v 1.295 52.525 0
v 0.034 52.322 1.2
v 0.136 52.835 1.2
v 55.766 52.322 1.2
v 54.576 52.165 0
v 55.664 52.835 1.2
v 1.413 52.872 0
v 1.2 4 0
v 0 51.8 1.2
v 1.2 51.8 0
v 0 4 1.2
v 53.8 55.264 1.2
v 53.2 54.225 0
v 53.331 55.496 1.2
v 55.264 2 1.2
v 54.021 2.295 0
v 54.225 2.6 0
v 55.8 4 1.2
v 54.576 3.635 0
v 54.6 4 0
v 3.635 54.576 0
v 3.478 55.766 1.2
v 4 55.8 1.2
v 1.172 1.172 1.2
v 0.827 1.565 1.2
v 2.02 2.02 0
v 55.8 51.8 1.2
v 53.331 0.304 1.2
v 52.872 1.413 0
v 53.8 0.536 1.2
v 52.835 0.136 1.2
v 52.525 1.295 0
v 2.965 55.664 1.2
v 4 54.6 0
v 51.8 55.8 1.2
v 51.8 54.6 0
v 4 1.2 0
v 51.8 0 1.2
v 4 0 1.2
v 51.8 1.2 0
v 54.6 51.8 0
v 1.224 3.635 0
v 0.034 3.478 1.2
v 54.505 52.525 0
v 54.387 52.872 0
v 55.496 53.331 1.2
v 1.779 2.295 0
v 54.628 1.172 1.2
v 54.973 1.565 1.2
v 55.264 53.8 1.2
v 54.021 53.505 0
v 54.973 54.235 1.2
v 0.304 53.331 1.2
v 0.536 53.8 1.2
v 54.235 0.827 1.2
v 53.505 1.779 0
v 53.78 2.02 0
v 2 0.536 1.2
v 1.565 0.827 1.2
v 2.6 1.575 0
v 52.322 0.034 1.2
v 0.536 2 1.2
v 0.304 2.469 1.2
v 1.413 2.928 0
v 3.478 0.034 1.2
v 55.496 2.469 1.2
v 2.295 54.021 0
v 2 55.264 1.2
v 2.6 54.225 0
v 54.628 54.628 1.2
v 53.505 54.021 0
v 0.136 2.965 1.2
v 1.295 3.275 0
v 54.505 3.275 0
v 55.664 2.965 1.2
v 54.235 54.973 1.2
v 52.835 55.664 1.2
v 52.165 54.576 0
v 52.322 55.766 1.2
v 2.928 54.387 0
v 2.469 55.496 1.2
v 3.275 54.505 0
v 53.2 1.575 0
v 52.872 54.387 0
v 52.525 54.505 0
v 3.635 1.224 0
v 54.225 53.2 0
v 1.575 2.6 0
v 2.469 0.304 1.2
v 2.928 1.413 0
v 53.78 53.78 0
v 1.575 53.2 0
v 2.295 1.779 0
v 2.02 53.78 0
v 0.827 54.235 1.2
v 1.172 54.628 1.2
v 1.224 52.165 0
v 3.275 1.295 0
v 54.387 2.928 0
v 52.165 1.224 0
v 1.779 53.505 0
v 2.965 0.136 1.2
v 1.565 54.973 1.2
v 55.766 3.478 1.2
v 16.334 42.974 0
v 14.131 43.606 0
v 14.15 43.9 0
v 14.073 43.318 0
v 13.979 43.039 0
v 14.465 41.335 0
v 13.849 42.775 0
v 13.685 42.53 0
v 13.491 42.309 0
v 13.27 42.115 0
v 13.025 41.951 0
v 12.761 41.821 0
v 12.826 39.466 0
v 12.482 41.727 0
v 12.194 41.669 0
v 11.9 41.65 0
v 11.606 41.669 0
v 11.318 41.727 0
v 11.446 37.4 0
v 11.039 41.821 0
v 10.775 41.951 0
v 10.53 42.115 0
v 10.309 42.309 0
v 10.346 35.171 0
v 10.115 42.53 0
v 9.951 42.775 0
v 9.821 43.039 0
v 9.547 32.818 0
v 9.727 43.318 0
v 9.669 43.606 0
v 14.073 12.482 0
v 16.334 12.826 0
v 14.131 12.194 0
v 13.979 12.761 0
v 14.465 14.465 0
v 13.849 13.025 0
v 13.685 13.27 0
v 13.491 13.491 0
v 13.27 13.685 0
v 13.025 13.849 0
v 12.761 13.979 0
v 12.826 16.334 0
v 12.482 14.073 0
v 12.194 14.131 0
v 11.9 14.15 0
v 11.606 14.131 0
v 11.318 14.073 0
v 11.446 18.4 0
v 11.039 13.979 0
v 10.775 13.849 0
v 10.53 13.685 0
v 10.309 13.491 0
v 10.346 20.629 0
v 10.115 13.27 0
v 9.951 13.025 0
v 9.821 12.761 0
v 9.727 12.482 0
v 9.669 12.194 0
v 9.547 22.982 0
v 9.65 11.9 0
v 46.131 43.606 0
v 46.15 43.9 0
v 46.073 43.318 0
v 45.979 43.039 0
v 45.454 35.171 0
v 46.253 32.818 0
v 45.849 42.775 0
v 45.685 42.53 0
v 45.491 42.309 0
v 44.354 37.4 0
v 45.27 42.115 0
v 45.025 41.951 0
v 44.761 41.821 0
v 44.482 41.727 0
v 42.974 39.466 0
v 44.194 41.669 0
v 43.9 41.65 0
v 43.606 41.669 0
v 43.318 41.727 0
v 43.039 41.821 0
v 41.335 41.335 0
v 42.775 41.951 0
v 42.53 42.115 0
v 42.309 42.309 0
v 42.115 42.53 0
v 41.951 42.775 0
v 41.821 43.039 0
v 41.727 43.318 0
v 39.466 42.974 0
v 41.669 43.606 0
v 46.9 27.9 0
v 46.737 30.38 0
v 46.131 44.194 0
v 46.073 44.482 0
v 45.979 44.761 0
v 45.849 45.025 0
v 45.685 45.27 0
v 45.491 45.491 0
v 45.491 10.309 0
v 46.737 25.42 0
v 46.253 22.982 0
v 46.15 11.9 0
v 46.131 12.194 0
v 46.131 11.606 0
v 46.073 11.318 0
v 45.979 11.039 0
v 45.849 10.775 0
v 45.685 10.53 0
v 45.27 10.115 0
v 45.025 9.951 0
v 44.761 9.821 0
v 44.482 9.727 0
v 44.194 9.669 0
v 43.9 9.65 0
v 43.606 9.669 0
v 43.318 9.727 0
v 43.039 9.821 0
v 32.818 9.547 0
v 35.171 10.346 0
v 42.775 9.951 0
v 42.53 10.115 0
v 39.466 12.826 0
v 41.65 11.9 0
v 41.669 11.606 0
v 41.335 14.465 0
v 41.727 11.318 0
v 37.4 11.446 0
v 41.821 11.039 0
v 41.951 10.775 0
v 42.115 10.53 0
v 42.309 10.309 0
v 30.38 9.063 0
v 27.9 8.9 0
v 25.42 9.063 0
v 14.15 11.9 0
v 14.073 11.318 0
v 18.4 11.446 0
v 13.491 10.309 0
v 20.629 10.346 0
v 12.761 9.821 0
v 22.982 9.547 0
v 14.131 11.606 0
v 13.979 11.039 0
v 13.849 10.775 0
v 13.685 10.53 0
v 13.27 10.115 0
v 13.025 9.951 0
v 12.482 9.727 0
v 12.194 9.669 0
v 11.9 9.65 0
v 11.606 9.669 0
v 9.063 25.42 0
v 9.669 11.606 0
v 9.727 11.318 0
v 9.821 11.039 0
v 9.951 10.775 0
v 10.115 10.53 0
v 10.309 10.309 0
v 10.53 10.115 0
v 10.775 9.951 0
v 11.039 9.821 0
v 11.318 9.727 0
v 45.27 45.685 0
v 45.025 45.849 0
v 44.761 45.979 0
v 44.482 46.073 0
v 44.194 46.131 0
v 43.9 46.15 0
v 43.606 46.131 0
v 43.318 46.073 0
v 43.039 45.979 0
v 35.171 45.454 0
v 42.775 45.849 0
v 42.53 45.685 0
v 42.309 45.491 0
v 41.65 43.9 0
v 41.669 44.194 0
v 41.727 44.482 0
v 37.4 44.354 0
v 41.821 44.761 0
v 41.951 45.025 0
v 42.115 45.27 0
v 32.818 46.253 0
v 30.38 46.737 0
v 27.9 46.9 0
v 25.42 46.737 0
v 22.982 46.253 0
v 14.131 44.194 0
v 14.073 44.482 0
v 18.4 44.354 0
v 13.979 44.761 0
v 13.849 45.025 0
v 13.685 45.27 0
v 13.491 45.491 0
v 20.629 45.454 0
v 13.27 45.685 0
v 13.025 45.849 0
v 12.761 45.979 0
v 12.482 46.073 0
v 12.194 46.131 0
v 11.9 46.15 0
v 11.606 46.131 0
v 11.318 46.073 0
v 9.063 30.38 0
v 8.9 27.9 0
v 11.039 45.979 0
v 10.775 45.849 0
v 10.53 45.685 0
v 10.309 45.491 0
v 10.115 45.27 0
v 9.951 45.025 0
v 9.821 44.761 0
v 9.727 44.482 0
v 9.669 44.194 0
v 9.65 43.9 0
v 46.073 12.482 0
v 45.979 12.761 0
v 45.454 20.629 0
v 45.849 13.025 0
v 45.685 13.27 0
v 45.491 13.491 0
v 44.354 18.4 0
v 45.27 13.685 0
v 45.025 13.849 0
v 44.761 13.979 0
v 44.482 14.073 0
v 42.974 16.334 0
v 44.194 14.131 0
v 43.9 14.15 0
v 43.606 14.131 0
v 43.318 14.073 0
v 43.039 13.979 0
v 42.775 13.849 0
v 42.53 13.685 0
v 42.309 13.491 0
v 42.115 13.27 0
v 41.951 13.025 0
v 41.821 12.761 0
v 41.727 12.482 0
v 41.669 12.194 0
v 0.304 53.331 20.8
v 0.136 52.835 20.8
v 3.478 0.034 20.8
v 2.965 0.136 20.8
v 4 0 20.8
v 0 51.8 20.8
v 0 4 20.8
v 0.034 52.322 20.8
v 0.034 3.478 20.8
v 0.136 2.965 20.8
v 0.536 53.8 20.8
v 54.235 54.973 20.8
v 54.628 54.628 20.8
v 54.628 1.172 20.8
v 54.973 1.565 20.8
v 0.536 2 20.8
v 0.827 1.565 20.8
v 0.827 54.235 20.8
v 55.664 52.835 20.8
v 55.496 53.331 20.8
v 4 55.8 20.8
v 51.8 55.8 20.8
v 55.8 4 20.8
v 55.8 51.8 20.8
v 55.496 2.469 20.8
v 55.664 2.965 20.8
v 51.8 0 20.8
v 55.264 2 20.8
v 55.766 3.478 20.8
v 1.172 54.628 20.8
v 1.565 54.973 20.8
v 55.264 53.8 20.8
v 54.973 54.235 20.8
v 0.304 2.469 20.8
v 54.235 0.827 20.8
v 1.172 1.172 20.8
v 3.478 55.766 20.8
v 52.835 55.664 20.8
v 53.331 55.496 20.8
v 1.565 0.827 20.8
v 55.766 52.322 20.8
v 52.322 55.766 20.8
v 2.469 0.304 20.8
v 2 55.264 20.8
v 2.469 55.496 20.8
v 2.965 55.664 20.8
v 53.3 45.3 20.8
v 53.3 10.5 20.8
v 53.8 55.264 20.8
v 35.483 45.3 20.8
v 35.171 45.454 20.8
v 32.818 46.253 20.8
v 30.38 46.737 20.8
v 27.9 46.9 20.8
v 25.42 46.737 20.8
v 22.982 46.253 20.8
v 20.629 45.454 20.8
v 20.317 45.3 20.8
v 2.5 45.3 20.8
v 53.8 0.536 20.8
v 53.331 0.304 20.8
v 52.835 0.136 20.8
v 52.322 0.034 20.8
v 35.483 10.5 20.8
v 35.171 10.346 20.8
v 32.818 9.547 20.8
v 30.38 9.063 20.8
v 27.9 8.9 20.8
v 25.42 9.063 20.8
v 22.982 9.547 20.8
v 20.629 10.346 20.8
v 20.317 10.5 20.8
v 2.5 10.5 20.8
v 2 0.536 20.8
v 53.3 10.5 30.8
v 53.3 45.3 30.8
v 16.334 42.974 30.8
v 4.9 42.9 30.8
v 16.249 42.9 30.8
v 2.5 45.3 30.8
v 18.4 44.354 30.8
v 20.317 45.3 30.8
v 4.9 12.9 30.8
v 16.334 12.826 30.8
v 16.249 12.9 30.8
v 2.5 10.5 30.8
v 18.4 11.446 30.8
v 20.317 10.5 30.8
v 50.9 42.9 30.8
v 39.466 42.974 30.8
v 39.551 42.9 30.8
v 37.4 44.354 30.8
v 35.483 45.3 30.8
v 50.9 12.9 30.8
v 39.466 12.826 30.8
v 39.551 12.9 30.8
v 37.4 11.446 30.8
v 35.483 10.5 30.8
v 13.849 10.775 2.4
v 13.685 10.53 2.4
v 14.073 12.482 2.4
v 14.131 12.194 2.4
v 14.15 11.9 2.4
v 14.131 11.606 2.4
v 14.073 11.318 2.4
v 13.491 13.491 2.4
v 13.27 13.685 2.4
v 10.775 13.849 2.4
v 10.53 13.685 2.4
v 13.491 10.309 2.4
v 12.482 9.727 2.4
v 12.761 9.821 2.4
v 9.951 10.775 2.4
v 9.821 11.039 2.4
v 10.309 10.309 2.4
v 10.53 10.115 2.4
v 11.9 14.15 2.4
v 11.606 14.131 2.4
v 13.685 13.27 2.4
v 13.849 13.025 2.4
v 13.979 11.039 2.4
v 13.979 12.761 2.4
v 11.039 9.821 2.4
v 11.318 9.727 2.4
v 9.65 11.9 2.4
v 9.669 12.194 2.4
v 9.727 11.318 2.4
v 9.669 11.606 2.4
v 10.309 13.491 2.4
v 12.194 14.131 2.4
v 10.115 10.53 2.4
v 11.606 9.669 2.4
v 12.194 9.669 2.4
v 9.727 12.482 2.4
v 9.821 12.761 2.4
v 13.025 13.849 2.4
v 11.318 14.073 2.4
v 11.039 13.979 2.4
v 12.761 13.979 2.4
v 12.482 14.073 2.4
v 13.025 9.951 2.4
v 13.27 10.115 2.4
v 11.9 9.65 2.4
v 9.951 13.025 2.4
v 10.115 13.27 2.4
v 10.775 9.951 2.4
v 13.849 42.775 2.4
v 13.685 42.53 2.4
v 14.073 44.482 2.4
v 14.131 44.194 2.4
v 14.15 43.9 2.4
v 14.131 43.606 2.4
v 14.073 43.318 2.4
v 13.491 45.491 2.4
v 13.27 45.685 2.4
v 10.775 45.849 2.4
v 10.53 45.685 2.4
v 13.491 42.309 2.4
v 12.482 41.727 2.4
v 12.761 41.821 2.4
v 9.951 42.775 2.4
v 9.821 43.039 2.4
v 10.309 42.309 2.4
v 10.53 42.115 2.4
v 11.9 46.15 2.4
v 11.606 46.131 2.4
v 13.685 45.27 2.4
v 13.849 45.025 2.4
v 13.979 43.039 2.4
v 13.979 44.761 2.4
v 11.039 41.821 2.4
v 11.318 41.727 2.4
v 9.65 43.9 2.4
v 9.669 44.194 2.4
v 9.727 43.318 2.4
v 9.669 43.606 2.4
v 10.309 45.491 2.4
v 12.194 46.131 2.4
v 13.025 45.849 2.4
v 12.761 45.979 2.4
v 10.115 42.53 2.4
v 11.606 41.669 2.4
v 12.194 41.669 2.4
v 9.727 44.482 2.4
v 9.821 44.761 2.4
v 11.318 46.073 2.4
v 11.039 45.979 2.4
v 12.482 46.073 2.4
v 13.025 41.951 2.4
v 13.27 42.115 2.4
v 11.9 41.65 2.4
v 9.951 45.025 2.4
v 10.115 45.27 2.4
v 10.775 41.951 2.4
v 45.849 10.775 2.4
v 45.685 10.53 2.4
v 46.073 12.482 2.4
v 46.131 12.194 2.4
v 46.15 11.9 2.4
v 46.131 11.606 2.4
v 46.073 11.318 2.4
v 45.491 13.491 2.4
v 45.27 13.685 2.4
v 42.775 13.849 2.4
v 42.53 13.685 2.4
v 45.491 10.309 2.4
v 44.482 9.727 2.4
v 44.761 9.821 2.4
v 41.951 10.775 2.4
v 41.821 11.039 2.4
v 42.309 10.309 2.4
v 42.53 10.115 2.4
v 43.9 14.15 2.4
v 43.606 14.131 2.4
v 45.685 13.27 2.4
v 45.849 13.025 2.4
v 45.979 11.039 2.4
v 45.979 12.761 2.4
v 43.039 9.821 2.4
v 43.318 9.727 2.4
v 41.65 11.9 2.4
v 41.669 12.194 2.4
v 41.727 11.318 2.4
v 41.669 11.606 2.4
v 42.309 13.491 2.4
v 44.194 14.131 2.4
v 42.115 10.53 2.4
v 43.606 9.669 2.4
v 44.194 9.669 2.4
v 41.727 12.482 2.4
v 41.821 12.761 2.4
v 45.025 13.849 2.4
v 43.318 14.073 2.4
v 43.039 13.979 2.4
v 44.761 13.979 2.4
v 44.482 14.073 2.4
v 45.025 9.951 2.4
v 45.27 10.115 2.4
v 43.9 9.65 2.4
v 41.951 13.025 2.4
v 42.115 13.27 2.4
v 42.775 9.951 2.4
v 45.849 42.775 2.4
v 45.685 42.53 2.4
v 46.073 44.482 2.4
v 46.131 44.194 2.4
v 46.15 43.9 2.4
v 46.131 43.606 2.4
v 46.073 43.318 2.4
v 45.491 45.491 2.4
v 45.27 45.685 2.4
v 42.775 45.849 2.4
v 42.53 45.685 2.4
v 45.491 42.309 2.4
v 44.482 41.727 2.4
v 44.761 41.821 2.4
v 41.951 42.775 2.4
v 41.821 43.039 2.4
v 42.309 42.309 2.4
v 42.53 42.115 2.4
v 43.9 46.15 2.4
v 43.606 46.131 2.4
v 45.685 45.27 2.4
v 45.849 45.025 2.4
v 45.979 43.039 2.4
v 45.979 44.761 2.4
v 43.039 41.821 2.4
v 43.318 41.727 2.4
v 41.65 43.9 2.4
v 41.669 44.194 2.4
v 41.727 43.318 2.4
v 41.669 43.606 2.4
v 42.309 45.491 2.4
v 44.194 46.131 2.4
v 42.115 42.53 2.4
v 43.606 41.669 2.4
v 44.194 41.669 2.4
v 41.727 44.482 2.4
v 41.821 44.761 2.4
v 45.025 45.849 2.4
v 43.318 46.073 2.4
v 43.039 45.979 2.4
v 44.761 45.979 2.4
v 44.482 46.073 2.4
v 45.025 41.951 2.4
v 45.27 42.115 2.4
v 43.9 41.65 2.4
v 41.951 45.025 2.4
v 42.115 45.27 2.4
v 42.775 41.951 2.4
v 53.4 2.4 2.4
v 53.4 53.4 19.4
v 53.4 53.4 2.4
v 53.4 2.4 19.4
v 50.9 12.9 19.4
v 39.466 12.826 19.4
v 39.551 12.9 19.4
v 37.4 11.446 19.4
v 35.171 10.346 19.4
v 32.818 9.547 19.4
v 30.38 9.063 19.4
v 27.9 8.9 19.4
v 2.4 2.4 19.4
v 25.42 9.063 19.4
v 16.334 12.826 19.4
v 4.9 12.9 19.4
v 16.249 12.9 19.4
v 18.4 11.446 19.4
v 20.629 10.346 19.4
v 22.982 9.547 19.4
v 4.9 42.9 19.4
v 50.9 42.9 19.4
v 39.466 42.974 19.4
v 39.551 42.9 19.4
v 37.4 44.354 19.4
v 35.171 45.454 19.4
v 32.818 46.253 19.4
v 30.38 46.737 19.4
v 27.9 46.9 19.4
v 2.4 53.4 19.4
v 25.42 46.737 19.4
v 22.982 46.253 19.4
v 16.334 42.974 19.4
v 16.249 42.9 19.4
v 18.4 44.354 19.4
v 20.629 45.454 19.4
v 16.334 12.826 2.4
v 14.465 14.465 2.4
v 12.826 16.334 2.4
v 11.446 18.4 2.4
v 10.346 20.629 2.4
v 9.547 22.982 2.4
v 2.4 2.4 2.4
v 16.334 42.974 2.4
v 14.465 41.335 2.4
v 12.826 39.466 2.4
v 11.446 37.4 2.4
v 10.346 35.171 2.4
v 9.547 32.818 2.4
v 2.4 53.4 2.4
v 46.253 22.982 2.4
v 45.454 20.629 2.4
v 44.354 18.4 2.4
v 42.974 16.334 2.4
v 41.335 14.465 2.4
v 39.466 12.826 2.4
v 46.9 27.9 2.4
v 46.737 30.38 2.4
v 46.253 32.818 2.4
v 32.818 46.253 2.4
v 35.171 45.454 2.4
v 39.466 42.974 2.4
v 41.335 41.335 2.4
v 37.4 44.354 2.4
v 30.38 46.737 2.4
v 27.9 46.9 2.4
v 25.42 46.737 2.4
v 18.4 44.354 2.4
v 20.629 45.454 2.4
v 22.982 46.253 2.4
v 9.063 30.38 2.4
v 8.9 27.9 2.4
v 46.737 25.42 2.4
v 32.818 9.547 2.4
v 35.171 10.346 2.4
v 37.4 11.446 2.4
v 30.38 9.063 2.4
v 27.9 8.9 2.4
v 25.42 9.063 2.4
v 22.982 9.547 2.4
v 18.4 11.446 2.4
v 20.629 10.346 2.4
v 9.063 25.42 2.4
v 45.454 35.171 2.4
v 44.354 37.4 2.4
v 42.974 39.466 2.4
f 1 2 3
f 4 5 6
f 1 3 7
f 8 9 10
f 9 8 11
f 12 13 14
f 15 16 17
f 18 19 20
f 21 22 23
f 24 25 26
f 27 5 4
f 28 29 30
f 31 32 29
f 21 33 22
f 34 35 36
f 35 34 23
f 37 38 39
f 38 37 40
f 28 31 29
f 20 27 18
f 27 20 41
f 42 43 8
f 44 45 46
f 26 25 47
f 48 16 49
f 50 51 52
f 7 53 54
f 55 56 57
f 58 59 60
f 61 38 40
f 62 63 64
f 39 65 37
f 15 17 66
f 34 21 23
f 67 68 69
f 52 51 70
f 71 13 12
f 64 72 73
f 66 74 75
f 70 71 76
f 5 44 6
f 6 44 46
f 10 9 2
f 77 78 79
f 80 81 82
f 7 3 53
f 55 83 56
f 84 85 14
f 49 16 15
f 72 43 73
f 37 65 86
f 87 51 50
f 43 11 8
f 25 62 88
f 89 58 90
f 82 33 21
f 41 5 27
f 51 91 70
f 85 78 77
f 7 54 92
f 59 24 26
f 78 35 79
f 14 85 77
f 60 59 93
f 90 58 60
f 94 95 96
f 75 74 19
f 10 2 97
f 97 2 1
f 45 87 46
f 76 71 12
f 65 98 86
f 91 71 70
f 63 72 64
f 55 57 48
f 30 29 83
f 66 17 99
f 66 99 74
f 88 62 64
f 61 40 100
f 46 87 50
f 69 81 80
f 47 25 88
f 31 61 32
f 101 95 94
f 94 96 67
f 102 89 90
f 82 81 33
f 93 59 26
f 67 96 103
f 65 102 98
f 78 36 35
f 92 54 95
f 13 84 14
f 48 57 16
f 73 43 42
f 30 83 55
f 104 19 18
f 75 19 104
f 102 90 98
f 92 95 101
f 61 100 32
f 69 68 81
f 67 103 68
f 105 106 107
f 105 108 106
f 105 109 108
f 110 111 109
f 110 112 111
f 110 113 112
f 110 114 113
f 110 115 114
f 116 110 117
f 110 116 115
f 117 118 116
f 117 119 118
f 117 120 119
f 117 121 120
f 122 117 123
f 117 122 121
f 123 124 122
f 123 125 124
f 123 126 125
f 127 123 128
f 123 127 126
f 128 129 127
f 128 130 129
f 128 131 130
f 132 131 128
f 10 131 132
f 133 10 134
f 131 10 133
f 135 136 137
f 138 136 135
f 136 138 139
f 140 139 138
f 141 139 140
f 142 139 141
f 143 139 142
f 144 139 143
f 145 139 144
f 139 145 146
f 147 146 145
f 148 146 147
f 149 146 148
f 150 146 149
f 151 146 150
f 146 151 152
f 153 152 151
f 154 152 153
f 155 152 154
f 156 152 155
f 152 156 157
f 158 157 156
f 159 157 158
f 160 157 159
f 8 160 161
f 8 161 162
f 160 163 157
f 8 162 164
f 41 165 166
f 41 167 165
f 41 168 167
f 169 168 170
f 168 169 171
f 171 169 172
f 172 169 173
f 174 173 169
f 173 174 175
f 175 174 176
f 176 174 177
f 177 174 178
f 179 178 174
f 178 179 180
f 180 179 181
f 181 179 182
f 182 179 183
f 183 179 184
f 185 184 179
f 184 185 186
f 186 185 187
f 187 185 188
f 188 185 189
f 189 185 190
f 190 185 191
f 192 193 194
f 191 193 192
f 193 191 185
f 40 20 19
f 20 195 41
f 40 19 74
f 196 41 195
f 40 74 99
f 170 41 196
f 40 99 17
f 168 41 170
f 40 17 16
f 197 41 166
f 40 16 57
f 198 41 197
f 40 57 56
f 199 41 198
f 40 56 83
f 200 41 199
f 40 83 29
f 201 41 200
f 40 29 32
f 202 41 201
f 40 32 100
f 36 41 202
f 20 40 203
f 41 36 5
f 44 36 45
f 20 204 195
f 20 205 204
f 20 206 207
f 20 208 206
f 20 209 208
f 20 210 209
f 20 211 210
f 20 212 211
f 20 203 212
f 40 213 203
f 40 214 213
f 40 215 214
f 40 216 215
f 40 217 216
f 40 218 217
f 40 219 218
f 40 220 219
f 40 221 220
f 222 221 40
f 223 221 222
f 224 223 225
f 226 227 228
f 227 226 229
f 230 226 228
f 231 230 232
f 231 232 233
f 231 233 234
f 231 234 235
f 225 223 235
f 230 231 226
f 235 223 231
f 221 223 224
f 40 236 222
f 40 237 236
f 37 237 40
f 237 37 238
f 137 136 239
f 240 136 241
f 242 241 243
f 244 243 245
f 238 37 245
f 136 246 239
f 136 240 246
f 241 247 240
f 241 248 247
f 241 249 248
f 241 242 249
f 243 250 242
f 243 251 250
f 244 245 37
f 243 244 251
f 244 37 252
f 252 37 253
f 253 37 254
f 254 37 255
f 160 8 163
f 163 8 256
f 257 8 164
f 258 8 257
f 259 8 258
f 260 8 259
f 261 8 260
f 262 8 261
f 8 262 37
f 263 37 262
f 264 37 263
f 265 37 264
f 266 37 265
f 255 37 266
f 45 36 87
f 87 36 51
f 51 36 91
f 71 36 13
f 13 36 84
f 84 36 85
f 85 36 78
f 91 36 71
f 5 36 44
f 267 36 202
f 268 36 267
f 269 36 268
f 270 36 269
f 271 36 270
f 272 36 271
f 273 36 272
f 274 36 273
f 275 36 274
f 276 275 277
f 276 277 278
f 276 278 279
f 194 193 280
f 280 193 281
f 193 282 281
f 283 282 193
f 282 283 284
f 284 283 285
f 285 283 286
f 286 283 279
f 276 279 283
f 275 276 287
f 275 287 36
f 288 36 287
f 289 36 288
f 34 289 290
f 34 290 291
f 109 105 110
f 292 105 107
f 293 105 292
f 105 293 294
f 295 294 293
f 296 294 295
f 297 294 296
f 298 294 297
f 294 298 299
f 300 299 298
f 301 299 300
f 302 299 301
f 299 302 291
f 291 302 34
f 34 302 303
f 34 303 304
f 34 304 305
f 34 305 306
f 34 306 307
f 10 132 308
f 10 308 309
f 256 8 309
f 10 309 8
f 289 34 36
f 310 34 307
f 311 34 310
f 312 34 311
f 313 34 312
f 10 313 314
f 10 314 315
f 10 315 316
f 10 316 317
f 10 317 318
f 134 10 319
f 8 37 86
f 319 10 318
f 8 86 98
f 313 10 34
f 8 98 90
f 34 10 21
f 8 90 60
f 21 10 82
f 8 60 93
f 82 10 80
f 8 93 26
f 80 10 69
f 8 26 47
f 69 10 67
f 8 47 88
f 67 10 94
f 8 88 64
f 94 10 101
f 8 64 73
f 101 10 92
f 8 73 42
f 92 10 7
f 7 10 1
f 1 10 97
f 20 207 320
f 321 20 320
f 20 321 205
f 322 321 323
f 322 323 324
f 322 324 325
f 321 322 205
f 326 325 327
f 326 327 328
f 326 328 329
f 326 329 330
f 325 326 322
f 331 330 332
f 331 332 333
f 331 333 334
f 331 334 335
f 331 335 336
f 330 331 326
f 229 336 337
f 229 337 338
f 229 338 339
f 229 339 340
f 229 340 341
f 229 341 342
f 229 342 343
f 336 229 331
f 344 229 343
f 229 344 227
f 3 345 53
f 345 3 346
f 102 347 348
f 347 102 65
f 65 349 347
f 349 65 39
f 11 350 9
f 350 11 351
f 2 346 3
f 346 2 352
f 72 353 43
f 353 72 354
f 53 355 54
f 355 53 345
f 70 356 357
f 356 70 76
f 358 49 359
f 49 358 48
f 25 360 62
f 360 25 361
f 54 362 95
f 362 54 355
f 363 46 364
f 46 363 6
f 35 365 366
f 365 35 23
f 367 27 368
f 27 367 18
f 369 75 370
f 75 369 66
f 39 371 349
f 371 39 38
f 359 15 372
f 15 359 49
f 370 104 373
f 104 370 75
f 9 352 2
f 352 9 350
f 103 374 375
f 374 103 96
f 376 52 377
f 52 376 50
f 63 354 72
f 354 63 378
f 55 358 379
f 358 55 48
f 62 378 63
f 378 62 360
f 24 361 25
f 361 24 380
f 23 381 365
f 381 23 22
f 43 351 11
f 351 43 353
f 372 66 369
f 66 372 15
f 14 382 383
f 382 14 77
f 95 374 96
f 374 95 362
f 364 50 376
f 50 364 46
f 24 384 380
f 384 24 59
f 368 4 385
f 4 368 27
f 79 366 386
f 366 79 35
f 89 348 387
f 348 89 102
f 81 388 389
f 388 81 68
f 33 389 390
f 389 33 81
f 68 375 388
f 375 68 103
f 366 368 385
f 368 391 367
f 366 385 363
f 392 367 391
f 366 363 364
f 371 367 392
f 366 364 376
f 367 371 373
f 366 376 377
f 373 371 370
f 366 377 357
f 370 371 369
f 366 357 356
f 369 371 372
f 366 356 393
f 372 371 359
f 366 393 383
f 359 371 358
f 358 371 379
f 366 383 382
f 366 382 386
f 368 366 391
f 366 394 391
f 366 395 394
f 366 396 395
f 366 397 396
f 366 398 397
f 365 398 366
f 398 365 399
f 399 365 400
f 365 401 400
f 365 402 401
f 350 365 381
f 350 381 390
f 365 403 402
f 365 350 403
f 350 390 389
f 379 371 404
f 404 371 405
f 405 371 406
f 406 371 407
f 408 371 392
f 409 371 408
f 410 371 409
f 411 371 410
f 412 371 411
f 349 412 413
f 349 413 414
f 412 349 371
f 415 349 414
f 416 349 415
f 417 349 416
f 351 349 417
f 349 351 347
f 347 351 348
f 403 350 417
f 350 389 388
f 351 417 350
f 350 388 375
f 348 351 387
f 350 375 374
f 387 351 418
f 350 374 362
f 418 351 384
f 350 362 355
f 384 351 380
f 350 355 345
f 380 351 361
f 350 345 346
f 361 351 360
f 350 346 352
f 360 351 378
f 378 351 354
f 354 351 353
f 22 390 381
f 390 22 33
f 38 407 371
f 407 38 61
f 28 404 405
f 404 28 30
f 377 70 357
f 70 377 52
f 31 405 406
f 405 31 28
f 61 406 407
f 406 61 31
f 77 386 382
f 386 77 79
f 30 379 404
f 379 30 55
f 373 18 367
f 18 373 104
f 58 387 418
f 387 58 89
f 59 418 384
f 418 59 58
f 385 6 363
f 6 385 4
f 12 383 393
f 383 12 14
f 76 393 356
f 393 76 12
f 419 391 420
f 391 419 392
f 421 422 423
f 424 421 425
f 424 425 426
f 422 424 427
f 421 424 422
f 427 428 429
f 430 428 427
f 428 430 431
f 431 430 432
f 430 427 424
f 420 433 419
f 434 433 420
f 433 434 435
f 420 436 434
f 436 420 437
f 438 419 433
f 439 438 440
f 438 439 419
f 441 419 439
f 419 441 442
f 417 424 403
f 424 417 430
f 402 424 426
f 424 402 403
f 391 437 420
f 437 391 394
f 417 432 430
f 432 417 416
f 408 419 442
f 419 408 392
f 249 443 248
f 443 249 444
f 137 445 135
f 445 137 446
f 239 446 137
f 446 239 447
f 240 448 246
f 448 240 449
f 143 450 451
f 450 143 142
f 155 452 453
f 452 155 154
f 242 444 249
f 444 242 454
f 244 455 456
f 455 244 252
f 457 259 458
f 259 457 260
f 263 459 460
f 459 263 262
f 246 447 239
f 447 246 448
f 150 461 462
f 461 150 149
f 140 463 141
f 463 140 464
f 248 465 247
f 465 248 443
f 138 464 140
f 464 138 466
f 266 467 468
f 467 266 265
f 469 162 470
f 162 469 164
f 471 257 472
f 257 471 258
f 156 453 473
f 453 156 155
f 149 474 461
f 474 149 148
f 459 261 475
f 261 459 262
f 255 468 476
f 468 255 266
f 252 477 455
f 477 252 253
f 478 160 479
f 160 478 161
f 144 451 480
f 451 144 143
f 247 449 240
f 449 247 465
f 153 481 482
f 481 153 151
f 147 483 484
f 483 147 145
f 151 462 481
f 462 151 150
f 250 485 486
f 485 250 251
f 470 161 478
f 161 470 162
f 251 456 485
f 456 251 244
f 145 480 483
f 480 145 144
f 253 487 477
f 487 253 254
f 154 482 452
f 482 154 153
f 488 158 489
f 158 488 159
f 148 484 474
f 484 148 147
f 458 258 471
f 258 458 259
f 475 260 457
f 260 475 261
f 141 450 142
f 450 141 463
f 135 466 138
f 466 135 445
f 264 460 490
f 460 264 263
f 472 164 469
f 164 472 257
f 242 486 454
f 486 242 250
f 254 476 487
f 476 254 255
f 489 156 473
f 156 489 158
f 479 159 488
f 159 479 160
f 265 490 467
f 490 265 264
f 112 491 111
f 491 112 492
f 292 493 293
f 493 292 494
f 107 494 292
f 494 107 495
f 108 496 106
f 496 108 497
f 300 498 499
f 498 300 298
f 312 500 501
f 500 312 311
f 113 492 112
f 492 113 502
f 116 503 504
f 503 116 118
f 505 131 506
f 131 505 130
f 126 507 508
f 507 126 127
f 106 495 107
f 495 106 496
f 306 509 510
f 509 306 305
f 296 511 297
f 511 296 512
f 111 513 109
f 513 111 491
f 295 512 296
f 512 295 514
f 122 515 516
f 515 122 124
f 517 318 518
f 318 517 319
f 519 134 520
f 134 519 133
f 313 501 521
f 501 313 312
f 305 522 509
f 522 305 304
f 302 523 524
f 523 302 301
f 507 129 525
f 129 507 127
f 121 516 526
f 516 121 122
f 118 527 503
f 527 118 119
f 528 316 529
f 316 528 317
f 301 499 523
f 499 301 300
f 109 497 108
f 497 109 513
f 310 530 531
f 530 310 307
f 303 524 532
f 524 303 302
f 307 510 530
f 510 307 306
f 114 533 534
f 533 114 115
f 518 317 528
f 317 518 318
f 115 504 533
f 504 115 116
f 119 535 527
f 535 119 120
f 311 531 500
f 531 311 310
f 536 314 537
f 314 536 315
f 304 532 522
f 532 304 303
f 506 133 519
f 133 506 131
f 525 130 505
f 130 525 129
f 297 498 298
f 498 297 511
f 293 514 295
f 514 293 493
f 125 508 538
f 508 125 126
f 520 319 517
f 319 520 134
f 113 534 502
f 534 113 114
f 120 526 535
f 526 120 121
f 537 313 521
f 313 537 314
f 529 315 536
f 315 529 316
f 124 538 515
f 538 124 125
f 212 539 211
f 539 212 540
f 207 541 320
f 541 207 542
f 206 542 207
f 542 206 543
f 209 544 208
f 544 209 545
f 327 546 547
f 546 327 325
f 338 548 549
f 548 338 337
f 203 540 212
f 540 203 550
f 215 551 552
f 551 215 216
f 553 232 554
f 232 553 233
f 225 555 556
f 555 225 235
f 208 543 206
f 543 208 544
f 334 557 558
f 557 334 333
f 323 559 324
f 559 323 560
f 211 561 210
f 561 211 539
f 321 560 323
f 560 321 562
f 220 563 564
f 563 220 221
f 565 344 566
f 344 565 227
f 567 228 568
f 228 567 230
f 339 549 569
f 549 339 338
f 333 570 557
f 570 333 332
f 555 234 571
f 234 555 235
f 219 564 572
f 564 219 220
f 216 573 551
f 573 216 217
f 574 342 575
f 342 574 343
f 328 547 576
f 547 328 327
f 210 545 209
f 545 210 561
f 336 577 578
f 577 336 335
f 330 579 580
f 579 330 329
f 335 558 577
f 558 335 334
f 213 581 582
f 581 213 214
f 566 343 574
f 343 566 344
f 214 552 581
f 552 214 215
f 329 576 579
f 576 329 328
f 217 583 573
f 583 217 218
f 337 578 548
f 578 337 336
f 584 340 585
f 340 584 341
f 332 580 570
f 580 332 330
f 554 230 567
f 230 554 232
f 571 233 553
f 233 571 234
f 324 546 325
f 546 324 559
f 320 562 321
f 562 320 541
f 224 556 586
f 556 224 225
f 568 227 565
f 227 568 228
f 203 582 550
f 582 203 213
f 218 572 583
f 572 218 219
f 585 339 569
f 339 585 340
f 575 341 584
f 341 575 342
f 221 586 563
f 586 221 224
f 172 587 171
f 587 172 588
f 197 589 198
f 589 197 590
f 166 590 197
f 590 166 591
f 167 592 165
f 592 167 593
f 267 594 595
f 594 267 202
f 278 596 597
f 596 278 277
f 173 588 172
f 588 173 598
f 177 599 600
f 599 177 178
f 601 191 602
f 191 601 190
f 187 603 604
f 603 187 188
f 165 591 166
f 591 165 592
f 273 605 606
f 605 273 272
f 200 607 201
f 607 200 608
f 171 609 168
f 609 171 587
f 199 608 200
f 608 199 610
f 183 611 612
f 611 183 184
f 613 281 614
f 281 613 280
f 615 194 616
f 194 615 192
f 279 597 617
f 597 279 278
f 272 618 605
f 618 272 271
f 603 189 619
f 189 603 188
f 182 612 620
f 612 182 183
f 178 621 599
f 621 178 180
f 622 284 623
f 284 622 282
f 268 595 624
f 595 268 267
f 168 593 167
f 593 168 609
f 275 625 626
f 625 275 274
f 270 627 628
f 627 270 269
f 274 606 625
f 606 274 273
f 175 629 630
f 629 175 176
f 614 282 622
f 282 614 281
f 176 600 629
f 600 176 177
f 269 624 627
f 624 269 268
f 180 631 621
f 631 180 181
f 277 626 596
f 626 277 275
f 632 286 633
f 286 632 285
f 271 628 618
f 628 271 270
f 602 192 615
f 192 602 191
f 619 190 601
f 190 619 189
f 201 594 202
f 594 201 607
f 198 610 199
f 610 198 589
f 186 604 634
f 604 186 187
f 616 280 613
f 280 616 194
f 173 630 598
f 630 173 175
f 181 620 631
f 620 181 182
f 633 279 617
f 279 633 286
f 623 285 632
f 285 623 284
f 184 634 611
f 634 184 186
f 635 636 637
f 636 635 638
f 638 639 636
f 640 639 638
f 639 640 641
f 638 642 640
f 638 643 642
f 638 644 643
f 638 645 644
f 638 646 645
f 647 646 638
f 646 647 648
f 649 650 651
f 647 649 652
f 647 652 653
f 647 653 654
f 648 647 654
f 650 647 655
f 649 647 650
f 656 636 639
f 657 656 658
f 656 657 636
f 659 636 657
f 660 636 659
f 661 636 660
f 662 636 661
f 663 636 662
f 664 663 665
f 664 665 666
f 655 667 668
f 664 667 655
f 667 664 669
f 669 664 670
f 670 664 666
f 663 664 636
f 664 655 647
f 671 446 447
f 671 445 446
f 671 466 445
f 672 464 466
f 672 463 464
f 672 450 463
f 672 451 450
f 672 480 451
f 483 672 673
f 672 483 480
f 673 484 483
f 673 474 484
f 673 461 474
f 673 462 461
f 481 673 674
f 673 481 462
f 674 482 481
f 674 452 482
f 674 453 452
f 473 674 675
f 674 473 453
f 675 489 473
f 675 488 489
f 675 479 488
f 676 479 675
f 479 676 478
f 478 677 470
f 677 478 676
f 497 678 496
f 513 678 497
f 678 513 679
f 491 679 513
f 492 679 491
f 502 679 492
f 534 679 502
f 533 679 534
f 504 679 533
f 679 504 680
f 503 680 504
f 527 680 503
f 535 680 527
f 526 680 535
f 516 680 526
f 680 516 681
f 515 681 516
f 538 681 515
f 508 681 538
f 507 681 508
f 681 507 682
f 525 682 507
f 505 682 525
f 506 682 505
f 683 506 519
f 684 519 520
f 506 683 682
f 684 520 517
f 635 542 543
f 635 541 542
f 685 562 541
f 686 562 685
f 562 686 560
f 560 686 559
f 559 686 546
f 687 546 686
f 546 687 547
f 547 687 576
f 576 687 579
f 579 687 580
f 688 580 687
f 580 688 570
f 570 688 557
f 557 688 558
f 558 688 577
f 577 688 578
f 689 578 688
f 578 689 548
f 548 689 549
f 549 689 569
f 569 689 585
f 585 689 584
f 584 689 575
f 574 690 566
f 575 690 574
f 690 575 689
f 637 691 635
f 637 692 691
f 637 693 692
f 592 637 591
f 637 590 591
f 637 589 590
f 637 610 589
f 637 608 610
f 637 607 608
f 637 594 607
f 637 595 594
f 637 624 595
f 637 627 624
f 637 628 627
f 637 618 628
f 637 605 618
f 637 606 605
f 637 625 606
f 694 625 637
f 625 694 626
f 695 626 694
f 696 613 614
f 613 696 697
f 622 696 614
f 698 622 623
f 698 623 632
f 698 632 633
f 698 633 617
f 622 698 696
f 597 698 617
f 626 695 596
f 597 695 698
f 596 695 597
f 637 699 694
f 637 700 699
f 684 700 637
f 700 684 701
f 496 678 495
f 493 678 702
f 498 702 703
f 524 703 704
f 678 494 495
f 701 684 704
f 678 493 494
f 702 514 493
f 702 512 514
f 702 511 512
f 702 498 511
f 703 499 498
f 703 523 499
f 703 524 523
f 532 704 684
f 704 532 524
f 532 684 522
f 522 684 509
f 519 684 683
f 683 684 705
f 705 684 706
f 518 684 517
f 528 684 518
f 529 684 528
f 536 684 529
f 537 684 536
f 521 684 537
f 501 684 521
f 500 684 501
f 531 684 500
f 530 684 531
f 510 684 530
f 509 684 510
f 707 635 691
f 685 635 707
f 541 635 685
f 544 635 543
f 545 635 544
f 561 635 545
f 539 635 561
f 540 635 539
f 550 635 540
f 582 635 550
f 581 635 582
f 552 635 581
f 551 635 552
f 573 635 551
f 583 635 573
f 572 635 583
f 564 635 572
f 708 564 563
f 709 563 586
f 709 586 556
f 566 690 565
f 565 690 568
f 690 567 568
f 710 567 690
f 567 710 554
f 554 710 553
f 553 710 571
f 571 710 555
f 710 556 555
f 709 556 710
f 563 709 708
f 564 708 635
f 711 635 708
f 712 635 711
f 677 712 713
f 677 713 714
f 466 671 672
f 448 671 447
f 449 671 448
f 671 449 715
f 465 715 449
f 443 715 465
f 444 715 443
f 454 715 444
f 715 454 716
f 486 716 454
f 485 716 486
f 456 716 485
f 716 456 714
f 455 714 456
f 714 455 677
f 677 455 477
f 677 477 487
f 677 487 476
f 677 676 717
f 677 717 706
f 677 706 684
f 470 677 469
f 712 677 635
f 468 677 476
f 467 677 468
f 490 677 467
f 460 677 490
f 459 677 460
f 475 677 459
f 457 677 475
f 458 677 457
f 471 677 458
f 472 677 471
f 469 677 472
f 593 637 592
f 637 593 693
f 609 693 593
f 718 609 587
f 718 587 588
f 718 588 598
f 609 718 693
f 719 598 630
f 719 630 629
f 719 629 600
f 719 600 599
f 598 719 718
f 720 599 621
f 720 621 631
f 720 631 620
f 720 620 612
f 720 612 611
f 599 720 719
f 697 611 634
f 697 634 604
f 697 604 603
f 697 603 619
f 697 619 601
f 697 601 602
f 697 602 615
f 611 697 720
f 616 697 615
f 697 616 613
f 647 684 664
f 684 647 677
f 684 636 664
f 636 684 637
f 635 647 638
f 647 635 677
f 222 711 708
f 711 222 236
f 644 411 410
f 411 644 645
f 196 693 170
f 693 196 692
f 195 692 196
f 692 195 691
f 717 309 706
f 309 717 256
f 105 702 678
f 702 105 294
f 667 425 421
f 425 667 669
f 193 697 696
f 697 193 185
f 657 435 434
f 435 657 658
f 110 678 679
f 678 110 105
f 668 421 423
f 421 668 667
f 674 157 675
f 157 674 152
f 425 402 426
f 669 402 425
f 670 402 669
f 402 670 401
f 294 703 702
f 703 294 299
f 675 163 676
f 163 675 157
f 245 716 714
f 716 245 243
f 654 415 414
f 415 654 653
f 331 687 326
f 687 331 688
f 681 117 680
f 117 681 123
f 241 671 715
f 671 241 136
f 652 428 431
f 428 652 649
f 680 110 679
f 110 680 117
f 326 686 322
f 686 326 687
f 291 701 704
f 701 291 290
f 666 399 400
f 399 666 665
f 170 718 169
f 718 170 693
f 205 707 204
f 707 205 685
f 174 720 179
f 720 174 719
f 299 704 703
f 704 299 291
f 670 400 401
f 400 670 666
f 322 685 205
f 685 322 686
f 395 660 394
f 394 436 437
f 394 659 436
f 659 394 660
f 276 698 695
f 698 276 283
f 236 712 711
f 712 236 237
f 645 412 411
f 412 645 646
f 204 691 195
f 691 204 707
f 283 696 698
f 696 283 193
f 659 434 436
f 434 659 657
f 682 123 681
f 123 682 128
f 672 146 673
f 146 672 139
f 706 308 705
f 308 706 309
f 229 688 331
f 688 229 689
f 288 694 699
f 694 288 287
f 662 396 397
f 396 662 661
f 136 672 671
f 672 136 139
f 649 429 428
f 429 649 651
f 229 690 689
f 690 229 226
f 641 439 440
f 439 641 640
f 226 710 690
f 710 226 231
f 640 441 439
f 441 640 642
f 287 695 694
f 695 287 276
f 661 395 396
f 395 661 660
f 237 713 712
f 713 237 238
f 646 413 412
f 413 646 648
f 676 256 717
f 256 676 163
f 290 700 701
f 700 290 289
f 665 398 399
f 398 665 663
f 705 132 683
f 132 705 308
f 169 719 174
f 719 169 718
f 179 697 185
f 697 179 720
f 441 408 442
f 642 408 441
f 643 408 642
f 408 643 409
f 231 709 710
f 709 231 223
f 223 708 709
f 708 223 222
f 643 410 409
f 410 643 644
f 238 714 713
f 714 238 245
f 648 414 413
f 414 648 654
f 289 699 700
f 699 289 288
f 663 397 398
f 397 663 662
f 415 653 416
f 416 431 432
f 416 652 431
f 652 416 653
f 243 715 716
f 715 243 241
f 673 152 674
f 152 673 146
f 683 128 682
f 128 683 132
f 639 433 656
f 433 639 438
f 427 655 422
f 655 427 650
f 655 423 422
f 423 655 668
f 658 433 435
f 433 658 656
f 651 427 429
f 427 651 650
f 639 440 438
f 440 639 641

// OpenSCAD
// file: ../common.scad
/* =============================================================================
 * 智慧香爐 — 共用輔助模組
 * =============================================================================
 * 圓角方柱、倒角、通風柵格、螺柱、頂緣台階、定位榫。
 * 零件檔一律 include 本檔（會連帶帶進 params.scad）。
 * ============================================================================= */

include <params.scad>

// ═══════════════════════════════════════════════════════════════════════════
// 共用輔助模組
// ═══════════════════════════════════════════════════════════════════════════

// 圓角方柱：用 4 根圓柱做 hull，比 minkowski 快很多
module rrect(w, d, h, r) {
    hull() {
        for (x = [r, w - r], y = [r, d - r])
            translate([x, y, 0]) cylinder(h = h, r = r);
    }
}

// 圓角方柱（底緣倒角版）：改善首層附著並讓外型更柔和
module rrect_chamfered(w, d, h, r, c = CHAMFER) {
    union() {
        // 倒角裙邊
        hull() {
            for (x = [r, w - r], y = [r, d - r])
                translate([x, y, 0]) cylinder(h = c, r1 = r - c, r2 = r);
        }
        translate([0, 0, c]) rrect(w, d, h - c, r);
    }
}

// 螺柱座（含自攻底孔）。pilot 依板子自己的孔徑給，不是統一值。
module standoff(h = STANDOFF_H, pilot = M3_PILOT) {
    difference() {
        cylinder(h = h, d = standoff_od(pilot));
        translate([0, 0, -0.1]) cylinder(h = h + 0.2, d = pilot);
    }
}

// 通風柵格：一排長圓孔。用於側面進氣與感測器艙開口。
module vent_slots(n, slot_w, slot_h, pitch, depth) {
    for (i = [0 : n - 1])
        translate([i * pitch, 0, 0])
            hull() {
                translate([0, slot_h / 2 - slot_w / 2, 0])
                    cylinder(h = depth, d = slot_w, $fn = 16);
                translate([0, -slot_h / 2 + slot_w / 2, 0])
                    cylinder(h = depth, d = slot_w, $fn = 16);
            }
}

// 頂緣承接台階：讓定位榫有實體可坐，同時作為上層零件的落座面
module top_ledge(w, d, z, r) {
    translate([0, 0, z])
        difference() {
            translate([WALL, WALL, 0])
                rrect(w - WALL * 2, d - WALL * 2, LEDGE_H, r - WALL);
            translate([WALL + LEDGE_W, WALL + LEDGE_W, -0.1])
                rrect(w - (WALL + LEDGE_W) * 2, d - (WALL + LEDGE_W) * 2,
                      LEDGE_H + 0.2, max(r - WALL - LEDGE_W, 0.5));
        }
}

// 定位榫（公）：四角
module tenons_male(w, d, z) {
    for (x = [TENON_INSET, w - TENON_INSET], y = [TENON_INSET, d - TENON_INSET])
        translate([x, y, z])
            cylinder(h = TENON_H, d1 = TENON_D, d2 = TENON_D - 1.2);  // 帶錐度好插入
}

// 定位榫（母）：對應的孔
module tenons_female(w, d, z) {
    for (x = [TENON_INSET, w - TENON_INSET], y = [TENON_INSET, d - TENON_INSET])
        translate([x, y, z - 0.1])
            cylinder(h = TENON_H + 0.2, d = TENON_D + FIT * 2);
}
// main file
/* =============================================================================
 * 智慧香爐 — 零件：風扇座
 * =============================================================================
 * 尺寸全部來自 ../params.scad，本檔不寫死任何數字。
 *
 * 單獨開這個檔（F5／F6）會直接看到這個零件；被 incense_burner.scad 以
 * ★use<>★ 引入時，檔尾的預覽呼叫不會執行——use 只帶進模組、不執行對方的
 * 頂層敘述，這正是「一檔一零件」又不污染組合件的作法。
 * ============================================================================= */

include <../common.scad>

// ═══════════════════════════════════════════════════════════════════════════
// 零件 4：風扇座（40mm 四線 PWM 軸流風扇；★2026-08-18 改為軸向貫穿★）
// ═══════════════════════════════════════════════════════════════════════════
// 軸流風扇：氣流「直接貫穿」——煙從集煙罩煙道進來（法蘭側），順著中央圓孔
// 被風扇軸向抽過去、從排氣面吹出。中央必須是一個真正貫穿的孔。
//
// ★原設計的封死坑（本次修正的重點）★
//   舊版軸向進氣孔寫成 cylinder(h = WALL + 0.2) 從 z=-0.1 起——只切穿底面
//   那層 WALL，停在與沉槽底幾乎共平面的位置。params.scad OVER 段警告過：
//   停在共平面時 CGAL 不保證切穿，會留下一層退化薄膜，孔實際上是封死的
//   （參數對、Volumes=2、F5 預覽都看不出來，只有 F6/匯出 STL 才現形）。
//   這裡改成從 -OVER 一路挖穿沉槽底、再穿過煙道法蘭，軸向真的通到底。
module fan_mount() {
    body_w = FAN_W + WALL * 2;
    body_h = FAN_H + WALL * 2;
    body_t = FAN_T + WALL * 2;
    flange_h = 10;                       // = incense_burner.scad 的 FAN_FLANGE_H

    difference() {
        union() {
            rrect_chamfered(body_w, body_h, body_t, 4);
            // 煙道法蘭：套住集煙罩後方開口、插進後壁定位
            translate([body_w / 2 - (DUCT_W + WALL * 2) / 2,
                       body_h / 2 - (DUCT_H + WALL * 2) / 2, body_t])
                cube([DUCT_W + WALL * 2, DUCT_H + WALL * 2, flange_h]);
        }

        // 風扇沉槽（軸流風扇本體嵌入，排氣面那側朝外）
        translate([WALL, WALL, WALL]) cube([FAN_W, FAN_H, FAN_T + 1]);

        // ★軸向貫穿孔——空氣真的通得過去★
        //   從 -OVER 一路穿到法蘭頂 +OVER，跨過沉槽底與法蘭，杜絕退化薄膜。
        translate([body_w / 2, body_h / 2, -OVER])
            cylinder(h = body_t + flange_h + OVER * 2, d = FAN_INLET_D);

        // 煙道內孔（法蘭段矩形，對接集煙罩煙道 DUCT_W×DUCT_H；與圓孔匯流）
        translate([body_w / 2 - DUCT_W / 2, body_h / 2 - DUCT_H / 2, WALL])
            cube([DUCT_W, DUCT_H, body_t - WALL + flange_h + OVER]);

        // M4 固定孔（40mm 軸流風扇，間距 FAN_SCREW_S＝32）——穿透底面法蘭
        for (x = [-1, 1], y = [-1, 1])
            translate([body_w / 2 + x * FAN_SCREW_S / 2,
                       body_h / 2 + y * FAN_SCREW_S / 2, -OVER])
                cylinder(h = WALL + OVER * 2, d = FAN_SCREW_D);
    }
}

// ── 單獨開檔時的預覽（被 use<> 引入時不執行）──
fan_mount();
